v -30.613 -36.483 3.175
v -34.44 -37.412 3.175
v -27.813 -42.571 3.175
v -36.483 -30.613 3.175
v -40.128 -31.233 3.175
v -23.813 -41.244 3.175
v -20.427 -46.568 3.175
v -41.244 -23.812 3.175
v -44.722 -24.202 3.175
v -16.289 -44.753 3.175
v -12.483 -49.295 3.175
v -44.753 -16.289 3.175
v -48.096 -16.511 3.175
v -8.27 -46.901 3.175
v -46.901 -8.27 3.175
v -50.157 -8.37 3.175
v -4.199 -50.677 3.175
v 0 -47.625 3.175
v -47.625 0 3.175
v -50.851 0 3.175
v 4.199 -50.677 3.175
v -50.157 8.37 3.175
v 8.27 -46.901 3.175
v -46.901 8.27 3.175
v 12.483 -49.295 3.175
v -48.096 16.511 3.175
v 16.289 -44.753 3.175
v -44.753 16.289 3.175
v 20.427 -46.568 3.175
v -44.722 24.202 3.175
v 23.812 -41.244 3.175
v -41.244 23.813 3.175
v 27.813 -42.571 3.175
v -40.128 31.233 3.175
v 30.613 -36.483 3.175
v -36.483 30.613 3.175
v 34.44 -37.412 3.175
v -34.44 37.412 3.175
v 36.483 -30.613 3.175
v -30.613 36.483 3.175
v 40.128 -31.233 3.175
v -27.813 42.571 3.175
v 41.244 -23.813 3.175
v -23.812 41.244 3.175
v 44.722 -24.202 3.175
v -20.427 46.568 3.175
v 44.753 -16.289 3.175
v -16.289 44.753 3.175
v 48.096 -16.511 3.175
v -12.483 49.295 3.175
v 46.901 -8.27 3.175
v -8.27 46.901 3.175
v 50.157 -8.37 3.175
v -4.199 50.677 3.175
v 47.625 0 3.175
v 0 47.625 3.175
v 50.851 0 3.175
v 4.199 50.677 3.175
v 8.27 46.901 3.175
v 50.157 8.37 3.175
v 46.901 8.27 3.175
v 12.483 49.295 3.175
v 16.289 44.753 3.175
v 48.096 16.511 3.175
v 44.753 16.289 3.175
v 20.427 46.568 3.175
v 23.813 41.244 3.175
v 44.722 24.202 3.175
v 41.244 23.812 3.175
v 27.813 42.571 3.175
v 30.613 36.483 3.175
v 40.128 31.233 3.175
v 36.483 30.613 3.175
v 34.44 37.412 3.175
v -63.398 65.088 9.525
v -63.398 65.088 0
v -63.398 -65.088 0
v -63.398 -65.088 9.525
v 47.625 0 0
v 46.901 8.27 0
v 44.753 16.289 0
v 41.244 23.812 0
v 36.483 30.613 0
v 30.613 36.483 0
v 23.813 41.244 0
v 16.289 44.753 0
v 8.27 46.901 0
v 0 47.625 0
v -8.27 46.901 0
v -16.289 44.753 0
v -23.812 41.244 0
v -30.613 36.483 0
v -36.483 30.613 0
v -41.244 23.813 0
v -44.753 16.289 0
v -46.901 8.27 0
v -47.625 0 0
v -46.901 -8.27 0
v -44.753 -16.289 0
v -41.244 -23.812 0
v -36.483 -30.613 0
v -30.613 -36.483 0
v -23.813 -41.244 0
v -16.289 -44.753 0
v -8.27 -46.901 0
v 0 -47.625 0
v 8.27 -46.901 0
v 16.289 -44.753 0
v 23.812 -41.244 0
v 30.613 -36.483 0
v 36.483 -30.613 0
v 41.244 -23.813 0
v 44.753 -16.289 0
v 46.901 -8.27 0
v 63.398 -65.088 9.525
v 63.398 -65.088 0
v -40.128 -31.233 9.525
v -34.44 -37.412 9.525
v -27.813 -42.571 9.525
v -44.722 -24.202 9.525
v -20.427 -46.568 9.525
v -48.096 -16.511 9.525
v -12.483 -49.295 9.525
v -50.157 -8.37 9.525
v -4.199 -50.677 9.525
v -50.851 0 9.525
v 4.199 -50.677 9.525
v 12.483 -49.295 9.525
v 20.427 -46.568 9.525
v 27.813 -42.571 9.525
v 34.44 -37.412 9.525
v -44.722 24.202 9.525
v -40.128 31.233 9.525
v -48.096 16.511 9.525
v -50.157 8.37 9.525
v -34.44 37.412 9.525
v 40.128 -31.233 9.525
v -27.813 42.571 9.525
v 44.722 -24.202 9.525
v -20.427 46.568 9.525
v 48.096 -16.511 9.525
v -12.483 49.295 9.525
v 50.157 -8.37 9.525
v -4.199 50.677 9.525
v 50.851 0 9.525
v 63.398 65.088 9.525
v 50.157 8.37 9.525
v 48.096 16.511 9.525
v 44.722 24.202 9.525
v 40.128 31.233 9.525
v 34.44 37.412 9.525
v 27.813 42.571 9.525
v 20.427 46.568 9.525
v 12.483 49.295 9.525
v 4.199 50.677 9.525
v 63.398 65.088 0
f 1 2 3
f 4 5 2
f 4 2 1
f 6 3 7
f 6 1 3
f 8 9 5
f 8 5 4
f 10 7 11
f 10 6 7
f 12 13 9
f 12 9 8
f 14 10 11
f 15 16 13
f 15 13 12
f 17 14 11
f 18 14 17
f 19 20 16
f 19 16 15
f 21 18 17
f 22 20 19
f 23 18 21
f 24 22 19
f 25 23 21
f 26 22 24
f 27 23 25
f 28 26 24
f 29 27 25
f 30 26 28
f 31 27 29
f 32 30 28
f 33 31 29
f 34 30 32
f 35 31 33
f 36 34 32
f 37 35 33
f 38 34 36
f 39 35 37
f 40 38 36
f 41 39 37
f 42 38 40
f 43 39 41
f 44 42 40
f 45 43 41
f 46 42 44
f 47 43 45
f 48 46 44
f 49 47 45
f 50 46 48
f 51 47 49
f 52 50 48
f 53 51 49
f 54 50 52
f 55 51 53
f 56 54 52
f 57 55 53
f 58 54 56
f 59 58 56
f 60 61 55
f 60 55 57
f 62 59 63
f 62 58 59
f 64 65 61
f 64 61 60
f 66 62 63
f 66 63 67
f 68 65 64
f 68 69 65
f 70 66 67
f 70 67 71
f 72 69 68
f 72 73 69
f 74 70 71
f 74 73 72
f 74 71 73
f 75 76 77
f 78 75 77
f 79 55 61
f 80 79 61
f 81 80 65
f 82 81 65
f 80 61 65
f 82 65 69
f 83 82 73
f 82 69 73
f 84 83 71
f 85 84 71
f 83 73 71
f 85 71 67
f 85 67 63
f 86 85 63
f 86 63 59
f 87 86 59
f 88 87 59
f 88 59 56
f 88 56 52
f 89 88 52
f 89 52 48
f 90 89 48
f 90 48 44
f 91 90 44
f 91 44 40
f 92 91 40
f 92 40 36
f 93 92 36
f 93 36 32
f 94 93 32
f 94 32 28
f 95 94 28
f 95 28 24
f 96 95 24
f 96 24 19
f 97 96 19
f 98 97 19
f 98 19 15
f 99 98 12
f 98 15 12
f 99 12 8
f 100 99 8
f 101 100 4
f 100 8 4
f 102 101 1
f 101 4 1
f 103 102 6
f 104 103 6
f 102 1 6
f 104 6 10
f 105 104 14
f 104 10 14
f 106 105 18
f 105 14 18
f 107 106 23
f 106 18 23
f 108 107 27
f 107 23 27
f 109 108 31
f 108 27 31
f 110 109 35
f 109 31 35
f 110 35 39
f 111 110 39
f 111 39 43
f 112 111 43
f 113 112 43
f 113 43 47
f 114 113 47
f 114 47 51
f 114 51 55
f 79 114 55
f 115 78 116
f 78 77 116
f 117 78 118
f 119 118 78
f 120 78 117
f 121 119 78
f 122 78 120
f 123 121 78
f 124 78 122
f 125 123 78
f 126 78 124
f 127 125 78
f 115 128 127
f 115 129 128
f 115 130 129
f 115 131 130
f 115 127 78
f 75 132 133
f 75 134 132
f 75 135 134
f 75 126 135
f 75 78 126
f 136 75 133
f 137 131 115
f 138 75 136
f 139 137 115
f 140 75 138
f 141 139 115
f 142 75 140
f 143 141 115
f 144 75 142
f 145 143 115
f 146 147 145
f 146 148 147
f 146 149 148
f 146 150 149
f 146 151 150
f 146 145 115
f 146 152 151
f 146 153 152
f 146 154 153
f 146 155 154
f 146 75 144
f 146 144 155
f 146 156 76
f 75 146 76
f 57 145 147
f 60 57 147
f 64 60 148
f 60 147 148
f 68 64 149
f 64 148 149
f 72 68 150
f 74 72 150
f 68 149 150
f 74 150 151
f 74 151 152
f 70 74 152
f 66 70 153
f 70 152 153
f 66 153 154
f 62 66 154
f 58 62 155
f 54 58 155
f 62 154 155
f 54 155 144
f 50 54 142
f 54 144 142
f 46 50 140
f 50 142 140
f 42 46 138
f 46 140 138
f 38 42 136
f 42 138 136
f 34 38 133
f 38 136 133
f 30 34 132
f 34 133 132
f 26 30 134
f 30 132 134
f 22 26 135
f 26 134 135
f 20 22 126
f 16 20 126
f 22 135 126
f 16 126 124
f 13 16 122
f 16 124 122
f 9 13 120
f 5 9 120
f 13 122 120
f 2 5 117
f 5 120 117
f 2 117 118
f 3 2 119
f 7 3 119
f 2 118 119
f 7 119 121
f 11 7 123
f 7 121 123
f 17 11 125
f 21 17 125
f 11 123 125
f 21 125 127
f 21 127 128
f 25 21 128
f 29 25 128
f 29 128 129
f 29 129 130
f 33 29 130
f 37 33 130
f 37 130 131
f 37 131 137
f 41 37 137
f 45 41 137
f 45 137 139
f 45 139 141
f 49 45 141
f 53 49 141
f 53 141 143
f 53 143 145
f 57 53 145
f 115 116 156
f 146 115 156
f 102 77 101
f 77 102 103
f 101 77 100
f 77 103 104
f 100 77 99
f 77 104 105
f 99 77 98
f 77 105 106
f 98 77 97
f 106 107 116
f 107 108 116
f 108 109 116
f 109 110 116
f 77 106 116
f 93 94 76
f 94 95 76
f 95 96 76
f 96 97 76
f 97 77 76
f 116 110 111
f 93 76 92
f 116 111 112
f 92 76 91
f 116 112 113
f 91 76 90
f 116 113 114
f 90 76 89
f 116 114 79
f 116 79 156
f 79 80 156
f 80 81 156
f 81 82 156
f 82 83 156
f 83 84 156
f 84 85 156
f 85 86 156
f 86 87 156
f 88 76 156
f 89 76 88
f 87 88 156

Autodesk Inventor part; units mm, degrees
ref_plane "YZ Plane" through (0, 0, 0) normal (1, 0, 0) x (0, 1, 0)
ref_plane "XZ Plane" through (0, 0, 0) normal (0, 1, 0) x (-1, 0, 0)
ref_plane "XY Plane" through (0, 0, 0) normal (0, 0, 1) x (1, 0, 0)
sketch "Sketch1" plane through (0, 0, 0) normal (0, 0, 1) x (1, 0, 0)
  line L0 (-63.3984, -65.0875) -> (63.3984, -65.0875)
  line L1 (63.3984, -65.0875) -> (63.3984, 65.0875)
  line L2 (63.3984, 65.0875) -> (-63.3984, 65.0875)
  line L3 (-63.3984, 65.0875) -> (-63.3984, -65.0875)
  line L4 (-63.3984, -65.0875) -> (63.3984, 65.0875) construction
  line L5 (63.3984, -65.0875) -> (-63.3984, 65.0875) construction
  point P0 (0, 0)
  dimension "d0" = 126.7968
  dimension "d1" = 130.175
extrude "Extrusion1" add sketch "Sketch1" along normal blind 9.525
sketch "Sketch2" plane through (0, 0, 9.525) normal (0, 0, 1) x (1, 0, 0)
  circle A0 centre (0, 0) radius 50.8508
  dimension "d4" = 101.7016
extrude "Extrusion2" cut sketch "Sketch2" against normal blind 6.35
sketch "Sketch3" plane through (0, 0, 3.175) normal (0, 0, 1) x (1, 0, 0)
  circle A0 centre (0, 0) radius 47.625
  dimension "d7" = 95.25
extrude "Extrusion3" cut sketch "Sketch3" along normal through all both and the other way through all
equation "\"d0\" = width - 2 * alignmentGrooveClearance"
equation "\"d1\" = height + 2 * alignmentGrooveDepth"
equation "\"d2\" = lensMountThickness"
equation "\"d4\" = lensDiameter + alignmentGrooveClearance"
equation "\"d5\" = lensInsetDepth"
equation "\"d7\" = lensDiameter - lensInsetDepth"
equation "\"d8\" = lensInsetDepth"
equation "\"caseThickness\" = 6.35"
equation "\"alignmentGrooveDepth\" = 1.5875"
equation "\"alignmentGrooveClearance\" = 0.1016"
equation "\"aerogelHolderDepth\" = 38.24501"
equation "\"height\" = 127"
equation "\"width\" = 127"
equation "\"depth\" = 247.57228"
equation "\"mirrorAngle\" = 2.5deg"
equation "\"mirrorThickness\" = 3.175"
equation "\"fresnelThickness\" = 0.254"
equation "\"focalLength\" = 185.82488"
equation "\"ior\" = 1.49"
equation "\"centerThickness\" = 1.27"
equation "\"fresnelAngle\" = 90deg"
equation "\"fresnelEffectiveDiameter\" = 152.4"
equation "\"fresnelGrooveWidth\" = 9.525"
equation "\"frontPanelThickness\" = 1.5875"
equation "\"lensMountThickness\" = 9.525"
equation "\"lensInsetDepth\" = 6.35"
equation "\"lensDiameter\" = 101.6"
equation "\"lensCenterThickness\" = 16.99999"
properties part number "sphericalLensHolder" material "ABS Plastic"
